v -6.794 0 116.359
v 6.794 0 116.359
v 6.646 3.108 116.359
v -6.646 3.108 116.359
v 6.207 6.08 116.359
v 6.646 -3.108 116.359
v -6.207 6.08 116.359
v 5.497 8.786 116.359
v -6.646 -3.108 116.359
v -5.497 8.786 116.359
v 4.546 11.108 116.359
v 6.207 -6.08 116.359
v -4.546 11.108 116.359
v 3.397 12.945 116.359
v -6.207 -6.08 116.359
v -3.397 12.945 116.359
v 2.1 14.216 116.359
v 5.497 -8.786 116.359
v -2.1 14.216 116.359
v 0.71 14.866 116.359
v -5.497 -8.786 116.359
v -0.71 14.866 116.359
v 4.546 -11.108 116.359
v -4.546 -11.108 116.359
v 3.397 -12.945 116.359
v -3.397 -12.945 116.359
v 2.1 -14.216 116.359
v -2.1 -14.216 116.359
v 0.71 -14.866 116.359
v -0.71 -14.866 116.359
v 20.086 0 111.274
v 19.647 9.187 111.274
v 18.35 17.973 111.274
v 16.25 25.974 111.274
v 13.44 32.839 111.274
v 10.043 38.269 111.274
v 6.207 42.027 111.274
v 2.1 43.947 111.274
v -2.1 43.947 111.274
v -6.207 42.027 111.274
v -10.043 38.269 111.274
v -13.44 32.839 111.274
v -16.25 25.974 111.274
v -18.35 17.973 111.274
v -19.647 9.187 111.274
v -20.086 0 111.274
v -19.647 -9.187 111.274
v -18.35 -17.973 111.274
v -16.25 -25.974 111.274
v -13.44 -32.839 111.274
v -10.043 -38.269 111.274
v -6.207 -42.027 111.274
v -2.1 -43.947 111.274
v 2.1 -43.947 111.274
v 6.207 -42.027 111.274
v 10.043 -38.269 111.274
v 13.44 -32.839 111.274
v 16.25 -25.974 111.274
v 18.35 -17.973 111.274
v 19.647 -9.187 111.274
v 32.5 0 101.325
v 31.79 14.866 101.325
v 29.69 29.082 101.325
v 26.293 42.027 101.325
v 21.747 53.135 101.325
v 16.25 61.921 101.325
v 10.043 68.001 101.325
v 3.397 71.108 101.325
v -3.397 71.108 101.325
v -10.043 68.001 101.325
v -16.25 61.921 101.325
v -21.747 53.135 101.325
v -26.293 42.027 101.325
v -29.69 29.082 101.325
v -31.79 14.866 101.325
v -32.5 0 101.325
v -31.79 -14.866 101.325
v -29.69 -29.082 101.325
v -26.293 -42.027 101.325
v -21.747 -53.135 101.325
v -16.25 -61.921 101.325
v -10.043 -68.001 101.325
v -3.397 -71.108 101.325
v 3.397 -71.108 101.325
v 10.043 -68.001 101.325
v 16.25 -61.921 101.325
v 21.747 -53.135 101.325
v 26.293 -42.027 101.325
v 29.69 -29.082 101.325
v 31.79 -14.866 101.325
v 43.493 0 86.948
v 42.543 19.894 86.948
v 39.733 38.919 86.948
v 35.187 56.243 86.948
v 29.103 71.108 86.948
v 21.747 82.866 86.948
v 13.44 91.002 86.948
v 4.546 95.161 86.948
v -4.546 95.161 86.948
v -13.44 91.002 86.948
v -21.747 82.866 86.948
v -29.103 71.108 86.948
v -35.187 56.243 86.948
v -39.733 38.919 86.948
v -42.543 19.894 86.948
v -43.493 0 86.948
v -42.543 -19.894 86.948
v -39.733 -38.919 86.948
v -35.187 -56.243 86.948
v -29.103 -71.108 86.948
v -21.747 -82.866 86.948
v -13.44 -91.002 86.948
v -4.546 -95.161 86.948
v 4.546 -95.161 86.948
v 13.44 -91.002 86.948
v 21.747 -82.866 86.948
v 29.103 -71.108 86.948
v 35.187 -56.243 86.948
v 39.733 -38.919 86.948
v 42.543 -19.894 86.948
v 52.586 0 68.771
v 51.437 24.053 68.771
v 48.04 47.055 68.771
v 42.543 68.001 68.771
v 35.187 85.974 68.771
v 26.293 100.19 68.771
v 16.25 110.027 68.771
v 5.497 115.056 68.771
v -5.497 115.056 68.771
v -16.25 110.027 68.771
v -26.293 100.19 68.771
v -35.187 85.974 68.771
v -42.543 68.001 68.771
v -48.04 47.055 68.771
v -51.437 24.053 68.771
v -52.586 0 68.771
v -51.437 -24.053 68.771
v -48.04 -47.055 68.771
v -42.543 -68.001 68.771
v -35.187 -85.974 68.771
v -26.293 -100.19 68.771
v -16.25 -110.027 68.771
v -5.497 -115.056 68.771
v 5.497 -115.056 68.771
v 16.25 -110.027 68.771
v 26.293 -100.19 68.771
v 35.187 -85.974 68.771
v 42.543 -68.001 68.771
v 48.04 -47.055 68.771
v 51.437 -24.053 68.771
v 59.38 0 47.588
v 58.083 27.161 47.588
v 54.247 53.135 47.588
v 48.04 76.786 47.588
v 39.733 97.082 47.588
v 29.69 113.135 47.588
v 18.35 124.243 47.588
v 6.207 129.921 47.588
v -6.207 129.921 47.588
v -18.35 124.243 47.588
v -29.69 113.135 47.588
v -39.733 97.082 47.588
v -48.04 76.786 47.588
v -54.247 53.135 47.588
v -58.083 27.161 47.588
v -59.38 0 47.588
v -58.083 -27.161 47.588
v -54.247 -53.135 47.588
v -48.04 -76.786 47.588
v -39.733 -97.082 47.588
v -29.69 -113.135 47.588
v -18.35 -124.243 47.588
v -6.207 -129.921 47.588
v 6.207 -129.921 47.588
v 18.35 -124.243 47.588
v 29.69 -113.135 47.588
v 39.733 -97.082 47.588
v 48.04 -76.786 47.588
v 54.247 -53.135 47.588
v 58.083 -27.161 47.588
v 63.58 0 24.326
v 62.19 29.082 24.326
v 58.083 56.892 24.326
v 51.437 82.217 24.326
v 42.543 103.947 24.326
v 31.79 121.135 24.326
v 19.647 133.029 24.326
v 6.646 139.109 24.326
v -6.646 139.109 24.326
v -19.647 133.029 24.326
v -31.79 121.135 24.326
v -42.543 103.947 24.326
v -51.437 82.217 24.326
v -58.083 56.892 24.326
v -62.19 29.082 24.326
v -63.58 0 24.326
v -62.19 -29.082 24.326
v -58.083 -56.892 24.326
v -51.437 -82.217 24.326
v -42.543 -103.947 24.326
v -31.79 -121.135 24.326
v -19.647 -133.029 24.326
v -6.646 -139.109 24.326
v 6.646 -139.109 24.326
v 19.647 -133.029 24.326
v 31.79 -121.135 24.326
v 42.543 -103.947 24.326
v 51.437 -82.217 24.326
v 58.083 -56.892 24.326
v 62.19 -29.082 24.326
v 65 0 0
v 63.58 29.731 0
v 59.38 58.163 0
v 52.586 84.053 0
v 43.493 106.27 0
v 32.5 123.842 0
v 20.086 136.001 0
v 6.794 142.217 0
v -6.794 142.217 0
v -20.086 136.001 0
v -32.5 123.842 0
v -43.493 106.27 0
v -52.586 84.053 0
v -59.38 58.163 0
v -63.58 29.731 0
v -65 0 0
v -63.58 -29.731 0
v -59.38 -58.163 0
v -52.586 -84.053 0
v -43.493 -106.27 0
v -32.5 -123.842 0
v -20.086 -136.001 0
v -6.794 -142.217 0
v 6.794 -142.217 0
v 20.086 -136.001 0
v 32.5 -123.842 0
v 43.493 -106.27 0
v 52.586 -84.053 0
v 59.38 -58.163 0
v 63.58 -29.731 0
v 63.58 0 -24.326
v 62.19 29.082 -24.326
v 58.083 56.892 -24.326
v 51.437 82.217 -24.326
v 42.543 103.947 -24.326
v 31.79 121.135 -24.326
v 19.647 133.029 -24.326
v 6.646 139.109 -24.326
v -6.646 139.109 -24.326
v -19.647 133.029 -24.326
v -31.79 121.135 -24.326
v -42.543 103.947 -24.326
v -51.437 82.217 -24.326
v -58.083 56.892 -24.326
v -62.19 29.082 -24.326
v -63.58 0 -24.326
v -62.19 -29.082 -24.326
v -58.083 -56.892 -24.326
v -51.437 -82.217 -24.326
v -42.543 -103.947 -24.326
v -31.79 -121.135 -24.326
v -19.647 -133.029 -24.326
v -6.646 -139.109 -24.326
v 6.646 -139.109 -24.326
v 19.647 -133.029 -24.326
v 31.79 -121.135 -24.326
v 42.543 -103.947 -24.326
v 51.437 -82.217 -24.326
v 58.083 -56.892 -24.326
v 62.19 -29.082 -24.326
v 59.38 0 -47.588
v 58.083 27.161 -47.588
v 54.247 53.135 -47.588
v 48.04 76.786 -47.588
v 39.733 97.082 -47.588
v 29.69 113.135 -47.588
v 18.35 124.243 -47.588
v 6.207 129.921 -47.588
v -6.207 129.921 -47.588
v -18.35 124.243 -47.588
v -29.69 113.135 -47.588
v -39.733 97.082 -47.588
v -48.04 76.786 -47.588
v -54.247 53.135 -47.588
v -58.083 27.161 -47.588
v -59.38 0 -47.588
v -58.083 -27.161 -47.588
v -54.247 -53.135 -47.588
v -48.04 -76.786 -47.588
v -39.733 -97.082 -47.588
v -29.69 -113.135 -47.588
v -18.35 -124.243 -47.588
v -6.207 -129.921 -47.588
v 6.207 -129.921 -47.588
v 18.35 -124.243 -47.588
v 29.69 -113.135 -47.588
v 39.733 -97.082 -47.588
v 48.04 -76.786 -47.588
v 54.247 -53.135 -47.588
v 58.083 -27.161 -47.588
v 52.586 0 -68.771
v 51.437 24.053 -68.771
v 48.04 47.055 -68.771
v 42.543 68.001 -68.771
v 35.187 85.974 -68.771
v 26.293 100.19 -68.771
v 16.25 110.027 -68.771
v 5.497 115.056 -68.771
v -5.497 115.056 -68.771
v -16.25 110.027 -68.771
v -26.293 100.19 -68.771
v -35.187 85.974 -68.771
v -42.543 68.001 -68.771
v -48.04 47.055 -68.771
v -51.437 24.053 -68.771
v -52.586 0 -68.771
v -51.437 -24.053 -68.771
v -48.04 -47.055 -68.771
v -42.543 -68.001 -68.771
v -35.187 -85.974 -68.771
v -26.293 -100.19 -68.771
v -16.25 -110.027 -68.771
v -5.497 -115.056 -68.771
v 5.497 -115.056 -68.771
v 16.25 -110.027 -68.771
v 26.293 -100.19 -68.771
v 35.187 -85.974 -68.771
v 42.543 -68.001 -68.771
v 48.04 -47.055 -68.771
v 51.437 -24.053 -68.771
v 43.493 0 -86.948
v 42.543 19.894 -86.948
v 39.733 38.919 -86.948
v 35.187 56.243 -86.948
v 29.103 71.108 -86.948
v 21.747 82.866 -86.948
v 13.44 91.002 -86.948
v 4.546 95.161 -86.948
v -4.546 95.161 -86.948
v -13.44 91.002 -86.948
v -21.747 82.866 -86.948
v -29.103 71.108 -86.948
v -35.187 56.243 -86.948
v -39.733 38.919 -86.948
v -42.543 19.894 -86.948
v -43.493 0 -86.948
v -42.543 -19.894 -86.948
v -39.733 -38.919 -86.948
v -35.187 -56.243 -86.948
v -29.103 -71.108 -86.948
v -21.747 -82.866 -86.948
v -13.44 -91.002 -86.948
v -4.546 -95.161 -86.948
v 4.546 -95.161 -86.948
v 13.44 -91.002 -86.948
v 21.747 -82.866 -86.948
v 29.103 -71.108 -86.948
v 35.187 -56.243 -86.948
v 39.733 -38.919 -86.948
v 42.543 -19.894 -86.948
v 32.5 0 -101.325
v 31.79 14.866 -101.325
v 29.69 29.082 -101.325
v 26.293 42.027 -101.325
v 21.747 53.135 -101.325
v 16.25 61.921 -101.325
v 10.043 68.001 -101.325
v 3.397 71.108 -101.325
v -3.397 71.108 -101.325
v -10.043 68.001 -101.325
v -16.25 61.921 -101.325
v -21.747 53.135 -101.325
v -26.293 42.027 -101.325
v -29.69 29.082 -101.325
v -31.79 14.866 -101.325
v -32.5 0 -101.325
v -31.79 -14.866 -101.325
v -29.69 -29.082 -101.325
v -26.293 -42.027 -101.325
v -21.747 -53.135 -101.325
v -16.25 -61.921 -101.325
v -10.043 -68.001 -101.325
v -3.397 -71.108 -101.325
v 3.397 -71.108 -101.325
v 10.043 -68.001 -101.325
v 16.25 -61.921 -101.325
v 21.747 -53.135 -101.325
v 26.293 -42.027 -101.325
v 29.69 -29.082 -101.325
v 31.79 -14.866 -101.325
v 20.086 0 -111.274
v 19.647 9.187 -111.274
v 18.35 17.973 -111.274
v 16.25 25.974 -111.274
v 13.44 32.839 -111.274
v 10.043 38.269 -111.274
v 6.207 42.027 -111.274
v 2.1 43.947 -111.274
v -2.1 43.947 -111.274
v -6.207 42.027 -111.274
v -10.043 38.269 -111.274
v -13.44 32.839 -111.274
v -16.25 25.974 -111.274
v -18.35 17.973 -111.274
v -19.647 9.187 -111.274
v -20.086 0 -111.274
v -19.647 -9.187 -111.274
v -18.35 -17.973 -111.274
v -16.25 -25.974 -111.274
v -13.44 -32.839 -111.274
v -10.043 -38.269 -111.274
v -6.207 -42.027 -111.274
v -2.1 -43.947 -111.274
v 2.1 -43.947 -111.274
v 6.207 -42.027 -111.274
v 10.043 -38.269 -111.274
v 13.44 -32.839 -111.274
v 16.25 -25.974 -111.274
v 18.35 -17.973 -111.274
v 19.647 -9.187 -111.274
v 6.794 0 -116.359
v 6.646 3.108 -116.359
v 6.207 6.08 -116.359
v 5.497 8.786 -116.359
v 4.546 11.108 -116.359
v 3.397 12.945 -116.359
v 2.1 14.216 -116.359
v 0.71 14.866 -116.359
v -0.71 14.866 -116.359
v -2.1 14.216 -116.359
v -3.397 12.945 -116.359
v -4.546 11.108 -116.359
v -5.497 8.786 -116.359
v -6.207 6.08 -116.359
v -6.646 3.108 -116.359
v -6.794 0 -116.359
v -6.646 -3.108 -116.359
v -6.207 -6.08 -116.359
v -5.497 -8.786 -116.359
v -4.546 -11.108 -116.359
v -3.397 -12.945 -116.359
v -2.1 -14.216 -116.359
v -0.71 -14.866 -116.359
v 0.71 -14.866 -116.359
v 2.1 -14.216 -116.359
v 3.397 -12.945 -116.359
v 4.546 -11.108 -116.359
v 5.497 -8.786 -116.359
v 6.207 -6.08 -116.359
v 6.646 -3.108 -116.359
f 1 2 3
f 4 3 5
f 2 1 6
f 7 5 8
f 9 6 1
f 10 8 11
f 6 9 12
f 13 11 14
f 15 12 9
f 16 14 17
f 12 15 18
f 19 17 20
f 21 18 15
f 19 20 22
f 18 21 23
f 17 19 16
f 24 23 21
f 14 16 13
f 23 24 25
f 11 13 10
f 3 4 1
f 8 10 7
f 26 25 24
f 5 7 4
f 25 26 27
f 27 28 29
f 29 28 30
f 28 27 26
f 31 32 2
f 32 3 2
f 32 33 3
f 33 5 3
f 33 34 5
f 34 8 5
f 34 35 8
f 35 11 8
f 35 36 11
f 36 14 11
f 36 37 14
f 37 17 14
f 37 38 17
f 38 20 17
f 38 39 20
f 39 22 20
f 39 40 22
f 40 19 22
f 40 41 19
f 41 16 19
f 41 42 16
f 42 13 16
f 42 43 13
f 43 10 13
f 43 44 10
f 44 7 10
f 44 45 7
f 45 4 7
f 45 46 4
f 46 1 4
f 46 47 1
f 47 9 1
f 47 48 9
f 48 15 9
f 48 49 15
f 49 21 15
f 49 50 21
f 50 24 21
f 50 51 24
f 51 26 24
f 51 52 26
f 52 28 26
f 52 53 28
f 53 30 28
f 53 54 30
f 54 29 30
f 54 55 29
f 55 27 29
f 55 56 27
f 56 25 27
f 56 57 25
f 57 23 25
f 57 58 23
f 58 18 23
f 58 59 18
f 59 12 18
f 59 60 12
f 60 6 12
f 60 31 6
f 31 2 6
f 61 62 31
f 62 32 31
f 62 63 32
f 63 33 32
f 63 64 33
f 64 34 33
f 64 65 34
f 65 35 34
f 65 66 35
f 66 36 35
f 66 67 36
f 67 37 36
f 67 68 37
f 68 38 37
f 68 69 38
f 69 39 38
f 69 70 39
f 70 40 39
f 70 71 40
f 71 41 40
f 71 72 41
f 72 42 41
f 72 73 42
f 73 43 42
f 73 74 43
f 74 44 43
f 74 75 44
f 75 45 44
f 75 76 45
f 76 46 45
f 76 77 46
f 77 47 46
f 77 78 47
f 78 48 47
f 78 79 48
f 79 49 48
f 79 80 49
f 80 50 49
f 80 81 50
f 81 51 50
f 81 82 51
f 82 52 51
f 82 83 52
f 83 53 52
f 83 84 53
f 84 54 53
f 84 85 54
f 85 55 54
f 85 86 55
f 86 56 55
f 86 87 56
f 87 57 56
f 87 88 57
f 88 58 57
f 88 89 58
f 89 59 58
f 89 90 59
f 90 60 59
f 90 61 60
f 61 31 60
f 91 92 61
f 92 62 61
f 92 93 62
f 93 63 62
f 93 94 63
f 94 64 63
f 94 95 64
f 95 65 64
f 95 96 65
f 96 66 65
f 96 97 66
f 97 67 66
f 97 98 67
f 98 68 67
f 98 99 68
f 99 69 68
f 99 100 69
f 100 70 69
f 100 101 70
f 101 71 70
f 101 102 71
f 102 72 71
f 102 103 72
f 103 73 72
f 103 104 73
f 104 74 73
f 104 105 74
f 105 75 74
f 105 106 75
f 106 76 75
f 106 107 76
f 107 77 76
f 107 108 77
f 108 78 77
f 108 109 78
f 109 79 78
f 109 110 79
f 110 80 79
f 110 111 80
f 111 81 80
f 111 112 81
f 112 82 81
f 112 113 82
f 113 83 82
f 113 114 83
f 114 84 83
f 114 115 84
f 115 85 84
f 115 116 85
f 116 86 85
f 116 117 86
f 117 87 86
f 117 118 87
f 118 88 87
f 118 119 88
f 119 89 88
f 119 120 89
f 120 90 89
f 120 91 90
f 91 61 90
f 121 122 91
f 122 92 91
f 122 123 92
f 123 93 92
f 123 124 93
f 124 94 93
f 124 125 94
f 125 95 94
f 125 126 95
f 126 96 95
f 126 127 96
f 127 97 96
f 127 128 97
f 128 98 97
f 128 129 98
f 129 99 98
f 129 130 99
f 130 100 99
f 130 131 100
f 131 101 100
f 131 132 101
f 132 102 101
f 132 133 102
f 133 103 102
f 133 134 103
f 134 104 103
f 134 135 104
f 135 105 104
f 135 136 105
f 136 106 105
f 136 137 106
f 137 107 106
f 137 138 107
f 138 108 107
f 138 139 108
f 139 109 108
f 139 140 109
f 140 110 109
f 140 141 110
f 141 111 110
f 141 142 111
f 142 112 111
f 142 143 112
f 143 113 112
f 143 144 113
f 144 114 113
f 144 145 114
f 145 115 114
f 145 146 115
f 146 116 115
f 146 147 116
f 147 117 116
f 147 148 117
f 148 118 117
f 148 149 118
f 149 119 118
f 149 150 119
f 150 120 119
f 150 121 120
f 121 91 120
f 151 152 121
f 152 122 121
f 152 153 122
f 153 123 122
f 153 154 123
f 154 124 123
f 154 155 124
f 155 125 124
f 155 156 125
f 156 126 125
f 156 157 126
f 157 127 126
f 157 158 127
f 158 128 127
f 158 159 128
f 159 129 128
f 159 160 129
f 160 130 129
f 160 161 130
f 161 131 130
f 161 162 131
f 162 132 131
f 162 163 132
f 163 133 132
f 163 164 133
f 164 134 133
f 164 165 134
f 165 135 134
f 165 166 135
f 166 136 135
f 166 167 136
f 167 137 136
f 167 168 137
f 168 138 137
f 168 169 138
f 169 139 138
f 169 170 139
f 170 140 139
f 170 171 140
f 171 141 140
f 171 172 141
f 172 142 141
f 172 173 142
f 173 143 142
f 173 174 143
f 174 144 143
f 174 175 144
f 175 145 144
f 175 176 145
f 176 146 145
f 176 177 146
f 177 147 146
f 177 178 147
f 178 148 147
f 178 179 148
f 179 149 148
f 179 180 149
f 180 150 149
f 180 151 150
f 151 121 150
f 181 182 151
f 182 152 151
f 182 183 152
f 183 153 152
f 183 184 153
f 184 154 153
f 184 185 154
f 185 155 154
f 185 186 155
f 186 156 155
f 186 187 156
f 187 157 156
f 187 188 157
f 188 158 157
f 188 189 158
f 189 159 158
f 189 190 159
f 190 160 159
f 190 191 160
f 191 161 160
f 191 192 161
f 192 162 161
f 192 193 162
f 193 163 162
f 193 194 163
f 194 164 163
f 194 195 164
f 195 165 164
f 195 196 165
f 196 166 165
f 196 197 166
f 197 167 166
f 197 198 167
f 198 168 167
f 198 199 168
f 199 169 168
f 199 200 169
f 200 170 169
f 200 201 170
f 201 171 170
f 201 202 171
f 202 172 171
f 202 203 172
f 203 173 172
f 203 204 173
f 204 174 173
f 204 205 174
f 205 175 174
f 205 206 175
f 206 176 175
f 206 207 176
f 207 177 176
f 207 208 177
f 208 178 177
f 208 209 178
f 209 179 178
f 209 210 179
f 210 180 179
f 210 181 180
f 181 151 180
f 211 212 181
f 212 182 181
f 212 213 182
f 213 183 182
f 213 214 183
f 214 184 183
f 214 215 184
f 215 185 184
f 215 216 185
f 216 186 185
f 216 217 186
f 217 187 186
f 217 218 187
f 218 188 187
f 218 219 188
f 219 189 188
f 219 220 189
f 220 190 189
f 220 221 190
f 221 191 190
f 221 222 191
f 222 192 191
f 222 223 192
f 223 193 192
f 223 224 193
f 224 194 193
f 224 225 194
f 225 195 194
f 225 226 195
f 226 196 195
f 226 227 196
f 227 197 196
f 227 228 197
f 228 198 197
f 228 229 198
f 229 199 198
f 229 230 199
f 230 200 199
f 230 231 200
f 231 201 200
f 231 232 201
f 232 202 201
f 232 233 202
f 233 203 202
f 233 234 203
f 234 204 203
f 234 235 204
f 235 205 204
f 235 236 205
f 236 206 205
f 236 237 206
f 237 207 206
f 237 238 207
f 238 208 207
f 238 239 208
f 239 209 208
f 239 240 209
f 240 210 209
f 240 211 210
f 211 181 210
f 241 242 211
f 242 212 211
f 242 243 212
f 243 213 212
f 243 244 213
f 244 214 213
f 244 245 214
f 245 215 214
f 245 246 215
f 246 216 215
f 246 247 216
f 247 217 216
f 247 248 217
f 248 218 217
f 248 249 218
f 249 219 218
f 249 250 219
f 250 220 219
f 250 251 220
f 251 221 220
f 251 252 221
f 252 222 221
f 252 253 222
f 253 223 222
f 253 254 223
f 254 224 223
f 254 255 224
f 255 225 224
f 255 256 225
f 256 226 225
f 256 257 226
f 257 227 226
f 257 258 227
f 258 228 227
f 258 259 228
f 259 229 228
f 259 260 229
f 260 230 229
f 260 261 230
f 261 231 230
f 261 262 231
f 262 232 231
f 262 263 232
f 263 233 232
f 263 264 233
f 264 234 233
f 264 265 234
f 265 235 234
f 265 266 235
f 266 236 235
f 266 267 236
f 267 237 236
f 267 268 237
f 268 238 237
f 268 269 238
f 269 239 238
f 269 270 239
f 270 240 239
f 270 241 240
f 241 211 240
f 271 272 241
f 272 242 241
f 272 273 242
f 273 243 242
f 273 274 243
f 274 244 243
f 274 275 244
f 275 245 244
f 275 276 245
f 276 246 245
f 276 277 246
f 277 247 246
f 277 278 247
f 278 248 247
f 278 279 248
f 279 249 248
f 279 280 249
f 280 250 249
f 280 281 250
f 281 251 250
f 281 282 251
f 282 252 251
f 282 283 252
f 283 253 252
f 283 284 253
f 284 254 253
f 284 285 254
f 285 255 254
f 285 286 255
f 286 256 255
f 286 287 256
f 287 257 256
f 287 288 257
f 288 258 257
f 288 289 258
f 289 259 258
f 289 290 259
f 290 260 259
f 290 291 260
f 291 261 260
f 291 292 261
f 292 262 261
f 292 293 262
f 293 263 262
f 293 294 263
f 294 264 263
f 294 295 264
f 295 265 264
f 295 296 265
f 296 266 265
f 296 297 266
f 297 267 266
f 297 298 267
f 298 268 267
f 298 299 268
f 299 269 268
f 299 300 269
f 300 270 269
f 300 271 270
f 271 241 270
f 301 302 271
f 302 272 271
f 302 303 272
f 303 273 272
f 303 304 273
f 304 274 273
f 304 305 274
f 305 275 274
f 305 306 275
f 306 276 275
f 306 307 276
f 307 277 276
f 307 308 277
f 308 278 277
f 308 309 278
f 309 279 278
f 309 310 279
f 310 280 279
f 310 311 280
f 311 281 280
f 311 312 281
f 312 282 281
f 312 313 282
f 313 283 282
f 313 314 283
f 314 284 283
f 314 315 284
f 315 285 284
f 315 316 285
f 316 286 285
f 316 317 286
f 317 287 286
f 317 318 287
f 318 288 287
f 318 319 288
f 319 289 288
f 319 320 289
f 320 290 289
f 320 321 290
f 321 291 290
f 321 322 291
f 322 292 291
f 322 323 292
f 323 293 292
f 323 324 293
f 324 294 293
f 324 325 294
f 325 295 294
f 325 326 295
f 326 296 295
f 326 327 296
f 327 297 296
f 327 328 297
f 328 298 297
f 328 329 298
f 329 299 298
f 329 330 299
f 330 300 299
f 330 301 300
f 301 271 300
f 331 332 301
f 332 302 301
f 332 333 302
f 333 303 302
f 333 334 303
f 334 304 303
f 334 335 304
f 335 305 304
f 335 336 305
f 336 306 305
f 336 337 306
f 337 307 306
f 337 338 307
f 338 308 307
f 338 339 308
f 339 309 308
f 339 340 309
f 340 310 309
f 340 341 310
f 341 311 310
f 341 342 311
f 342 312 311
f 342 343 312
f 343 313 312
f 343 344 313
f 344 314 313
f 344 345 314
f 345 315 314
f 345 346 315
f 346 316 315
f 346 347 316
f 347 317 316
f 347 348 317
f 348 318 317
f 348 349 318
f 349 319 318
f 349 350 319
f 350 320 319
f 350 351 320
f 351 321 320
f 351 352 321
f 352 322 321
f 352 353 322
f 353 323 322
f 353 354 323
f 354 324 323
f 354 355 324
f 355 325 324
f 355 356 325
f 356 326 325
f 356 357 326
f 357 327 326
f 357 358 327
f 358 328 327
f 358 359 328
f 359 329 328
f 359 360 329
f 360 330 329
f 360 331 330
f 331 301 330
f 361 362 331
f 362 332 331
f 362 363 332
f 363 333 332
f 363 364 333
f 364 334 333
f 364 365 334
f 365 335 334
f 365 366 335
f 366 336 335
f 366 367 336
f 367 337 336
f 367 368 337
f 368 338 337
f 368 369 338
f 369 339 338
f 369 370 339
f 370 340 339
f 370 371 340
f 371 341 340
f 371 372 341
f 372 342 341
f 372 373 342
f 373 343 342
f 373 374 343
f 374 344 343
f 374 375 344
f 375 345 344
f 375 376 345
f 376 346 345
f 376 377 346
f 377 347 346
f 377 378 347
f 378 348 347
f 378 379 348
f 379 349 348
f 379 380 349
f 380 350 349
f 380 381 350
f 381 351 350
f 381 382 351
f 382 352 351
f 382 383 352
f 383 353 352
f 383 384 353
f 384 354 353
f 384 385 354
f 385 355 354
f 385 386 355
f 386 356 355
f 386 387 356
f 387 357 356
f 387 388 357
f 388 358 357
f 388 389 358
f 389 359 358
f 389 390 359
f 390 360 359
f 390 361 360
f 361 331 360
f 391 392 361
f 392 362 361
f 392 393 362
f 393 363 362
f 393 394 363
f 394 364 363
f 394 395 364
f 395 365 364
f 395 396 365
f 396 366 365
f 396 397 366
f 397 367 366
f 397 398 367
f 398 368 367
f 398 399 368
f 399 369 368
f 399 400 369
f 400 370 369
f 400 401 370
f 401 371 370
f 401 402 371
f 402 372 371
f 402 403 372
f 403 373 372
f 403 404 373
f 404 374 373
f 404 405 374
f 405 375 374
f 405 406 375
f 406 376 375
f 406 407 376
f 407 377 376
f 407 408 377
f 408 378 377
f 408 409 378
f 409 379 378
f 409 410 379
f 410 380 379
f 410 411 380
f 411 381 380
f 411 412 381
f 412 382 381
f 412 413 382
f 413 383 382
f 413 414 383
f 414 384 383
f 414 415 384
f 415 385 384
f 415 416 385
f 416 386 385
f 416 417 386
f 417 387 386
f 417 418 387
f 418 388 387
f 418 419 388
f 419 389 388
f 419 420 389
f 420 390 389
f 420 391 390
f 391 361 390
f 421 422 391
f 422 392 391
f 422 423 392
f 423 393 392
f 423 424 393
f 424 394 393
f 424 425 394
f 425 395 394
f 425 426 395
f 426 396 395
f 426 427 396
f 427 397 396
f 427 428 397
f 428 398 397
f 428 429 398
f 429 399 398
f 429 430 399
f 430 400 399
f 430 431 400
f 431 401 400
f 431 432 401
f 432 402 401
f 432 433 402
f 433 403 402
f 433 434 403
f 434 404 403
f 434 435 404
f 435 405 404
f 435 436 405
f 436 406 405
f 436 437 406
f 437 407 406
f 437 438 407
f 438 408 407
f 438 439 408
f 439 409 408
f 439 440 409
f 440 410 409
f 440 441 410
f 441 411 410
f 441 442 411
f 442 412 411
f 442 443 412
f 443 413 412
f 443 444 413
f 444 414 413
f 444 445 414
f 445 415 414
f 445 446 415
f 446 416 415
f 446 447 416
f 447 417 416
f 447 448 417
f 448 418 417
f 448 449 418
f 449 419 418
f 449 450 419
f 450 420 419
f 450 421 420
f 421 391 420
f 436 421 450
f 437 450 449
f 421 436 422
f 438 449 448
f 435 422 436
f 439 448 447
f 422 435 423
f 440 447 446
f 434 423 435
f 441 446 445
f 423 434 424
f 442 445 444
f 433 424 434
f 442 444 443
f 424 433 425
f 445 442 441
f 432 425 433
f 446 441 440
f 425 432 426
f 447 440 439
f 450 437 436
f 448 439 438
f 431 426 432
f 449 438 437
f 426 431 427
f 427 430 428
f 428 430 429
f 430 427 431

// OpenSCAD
// Generated by SolidPython 1.0.1 on 2020-07-29 00:46:46


scale(v = [5, 11, 9]) {
	sphere(r = 13);
}
/***********************************************
*********      SolidPython code:      **********
************************************************
 
# import packages: SolidPython
from solid import *
from solid.utils import *
from itertools import chain, combinations, permutations


class Resize:

    def __init__(self, scad_file):
        self.scad_file = scad_file
        #self.scad_file = import_scad(scad_file)
        # cone/cylinder param:
        self.r1 = 0
        self.r2 = 0
        self.h = 0
        # rectangular prism param:
        self.w = 0
        self.l = 0
        # ellipse param:
        self.r = 0

    # import OpenScad code (file name corresponds to shape)


    # classify shape + parameters
    def assign(self, param1, param2, param3):
        if self.scad_file == 'cone.scad':
            self.r1 = param1
            self.r2 = param2
            self.h = param3
        elif self.scad_file == 'cylinder.scad':
            self.r1 = param1
            self.r2 = param2
            self.h = param3
        elif self.scad_file == 'rectangularPrism.scad':
            self.h = param1
            self.l = param2
            self.w = param3
        else:
            self.r = param1
            self.h = param2

    # resize parameters
    def iterate(self):
        x = range(3, 20, 2)
        i = 1
        if self.scad_file == 'cone.scad':
            tempList = list(permutations(x, 2))
            for temp in tempList:
                param1 = temp[0]
                param2 = temp[1]
                filepath = 'produced_scad_files/' + 'cone' + str(param1) + '_' + str(param2) + '_' + '.scad'
                scad_render_to_file(cylinder(h=param1, r1=param2, r2=0), filepath)

        elif self.scad_file == 'cylinder.scad':
            tempList = list(permutations(x, 3))
            for temp in tempList:
                param1 = temp[0]
                param2 = temp[1]
                filepath = 'produced_scad_files/' + 'cylinder' + str(param1) + '_' + str(param2) + '_' + '.scad'
                scad_render_to_file(cylinder(h=param1, r1=param2, r2=param2), filepath)

        elif self.scad_file == 'rectangularPrism.scad':
            tempList = list(permutations(x, 3))
            for temp in tempList:
                param1 = temp[0]
                param2 = temp[1]
                param3 = temp[2]
                filepath = 'produced_scad_files/' + 'rectangularPrism' + str(param1) + '_' + str(param2) + '_' + str(
                    param3) + '.scad'
                scad_render_to_file(cube(size=(param1, param2, param3)), filepath)

        elif self.scad_file == 'ellipse.scad':
            tempList = list(permutations(x, 4))
            for temp in tempList:
                param1 = temp[0]
                param2 = temp[1]
                param3 = temp[2]
                param4 = temp[3]
                filepath = 'produced_scad_files/' + 'ellipse' + str(param1) + '_' + str(param2) + '_' + str(param3) + '_' + str(param4) + '.scad'
                scad_render_to_file(scale([param1, param2, param3])(sphere(r=param4)), filepath)

    def render_to_scadfile(self):
        scad_render_to_file(scad, 'example.scad') 
 
************************************************/
